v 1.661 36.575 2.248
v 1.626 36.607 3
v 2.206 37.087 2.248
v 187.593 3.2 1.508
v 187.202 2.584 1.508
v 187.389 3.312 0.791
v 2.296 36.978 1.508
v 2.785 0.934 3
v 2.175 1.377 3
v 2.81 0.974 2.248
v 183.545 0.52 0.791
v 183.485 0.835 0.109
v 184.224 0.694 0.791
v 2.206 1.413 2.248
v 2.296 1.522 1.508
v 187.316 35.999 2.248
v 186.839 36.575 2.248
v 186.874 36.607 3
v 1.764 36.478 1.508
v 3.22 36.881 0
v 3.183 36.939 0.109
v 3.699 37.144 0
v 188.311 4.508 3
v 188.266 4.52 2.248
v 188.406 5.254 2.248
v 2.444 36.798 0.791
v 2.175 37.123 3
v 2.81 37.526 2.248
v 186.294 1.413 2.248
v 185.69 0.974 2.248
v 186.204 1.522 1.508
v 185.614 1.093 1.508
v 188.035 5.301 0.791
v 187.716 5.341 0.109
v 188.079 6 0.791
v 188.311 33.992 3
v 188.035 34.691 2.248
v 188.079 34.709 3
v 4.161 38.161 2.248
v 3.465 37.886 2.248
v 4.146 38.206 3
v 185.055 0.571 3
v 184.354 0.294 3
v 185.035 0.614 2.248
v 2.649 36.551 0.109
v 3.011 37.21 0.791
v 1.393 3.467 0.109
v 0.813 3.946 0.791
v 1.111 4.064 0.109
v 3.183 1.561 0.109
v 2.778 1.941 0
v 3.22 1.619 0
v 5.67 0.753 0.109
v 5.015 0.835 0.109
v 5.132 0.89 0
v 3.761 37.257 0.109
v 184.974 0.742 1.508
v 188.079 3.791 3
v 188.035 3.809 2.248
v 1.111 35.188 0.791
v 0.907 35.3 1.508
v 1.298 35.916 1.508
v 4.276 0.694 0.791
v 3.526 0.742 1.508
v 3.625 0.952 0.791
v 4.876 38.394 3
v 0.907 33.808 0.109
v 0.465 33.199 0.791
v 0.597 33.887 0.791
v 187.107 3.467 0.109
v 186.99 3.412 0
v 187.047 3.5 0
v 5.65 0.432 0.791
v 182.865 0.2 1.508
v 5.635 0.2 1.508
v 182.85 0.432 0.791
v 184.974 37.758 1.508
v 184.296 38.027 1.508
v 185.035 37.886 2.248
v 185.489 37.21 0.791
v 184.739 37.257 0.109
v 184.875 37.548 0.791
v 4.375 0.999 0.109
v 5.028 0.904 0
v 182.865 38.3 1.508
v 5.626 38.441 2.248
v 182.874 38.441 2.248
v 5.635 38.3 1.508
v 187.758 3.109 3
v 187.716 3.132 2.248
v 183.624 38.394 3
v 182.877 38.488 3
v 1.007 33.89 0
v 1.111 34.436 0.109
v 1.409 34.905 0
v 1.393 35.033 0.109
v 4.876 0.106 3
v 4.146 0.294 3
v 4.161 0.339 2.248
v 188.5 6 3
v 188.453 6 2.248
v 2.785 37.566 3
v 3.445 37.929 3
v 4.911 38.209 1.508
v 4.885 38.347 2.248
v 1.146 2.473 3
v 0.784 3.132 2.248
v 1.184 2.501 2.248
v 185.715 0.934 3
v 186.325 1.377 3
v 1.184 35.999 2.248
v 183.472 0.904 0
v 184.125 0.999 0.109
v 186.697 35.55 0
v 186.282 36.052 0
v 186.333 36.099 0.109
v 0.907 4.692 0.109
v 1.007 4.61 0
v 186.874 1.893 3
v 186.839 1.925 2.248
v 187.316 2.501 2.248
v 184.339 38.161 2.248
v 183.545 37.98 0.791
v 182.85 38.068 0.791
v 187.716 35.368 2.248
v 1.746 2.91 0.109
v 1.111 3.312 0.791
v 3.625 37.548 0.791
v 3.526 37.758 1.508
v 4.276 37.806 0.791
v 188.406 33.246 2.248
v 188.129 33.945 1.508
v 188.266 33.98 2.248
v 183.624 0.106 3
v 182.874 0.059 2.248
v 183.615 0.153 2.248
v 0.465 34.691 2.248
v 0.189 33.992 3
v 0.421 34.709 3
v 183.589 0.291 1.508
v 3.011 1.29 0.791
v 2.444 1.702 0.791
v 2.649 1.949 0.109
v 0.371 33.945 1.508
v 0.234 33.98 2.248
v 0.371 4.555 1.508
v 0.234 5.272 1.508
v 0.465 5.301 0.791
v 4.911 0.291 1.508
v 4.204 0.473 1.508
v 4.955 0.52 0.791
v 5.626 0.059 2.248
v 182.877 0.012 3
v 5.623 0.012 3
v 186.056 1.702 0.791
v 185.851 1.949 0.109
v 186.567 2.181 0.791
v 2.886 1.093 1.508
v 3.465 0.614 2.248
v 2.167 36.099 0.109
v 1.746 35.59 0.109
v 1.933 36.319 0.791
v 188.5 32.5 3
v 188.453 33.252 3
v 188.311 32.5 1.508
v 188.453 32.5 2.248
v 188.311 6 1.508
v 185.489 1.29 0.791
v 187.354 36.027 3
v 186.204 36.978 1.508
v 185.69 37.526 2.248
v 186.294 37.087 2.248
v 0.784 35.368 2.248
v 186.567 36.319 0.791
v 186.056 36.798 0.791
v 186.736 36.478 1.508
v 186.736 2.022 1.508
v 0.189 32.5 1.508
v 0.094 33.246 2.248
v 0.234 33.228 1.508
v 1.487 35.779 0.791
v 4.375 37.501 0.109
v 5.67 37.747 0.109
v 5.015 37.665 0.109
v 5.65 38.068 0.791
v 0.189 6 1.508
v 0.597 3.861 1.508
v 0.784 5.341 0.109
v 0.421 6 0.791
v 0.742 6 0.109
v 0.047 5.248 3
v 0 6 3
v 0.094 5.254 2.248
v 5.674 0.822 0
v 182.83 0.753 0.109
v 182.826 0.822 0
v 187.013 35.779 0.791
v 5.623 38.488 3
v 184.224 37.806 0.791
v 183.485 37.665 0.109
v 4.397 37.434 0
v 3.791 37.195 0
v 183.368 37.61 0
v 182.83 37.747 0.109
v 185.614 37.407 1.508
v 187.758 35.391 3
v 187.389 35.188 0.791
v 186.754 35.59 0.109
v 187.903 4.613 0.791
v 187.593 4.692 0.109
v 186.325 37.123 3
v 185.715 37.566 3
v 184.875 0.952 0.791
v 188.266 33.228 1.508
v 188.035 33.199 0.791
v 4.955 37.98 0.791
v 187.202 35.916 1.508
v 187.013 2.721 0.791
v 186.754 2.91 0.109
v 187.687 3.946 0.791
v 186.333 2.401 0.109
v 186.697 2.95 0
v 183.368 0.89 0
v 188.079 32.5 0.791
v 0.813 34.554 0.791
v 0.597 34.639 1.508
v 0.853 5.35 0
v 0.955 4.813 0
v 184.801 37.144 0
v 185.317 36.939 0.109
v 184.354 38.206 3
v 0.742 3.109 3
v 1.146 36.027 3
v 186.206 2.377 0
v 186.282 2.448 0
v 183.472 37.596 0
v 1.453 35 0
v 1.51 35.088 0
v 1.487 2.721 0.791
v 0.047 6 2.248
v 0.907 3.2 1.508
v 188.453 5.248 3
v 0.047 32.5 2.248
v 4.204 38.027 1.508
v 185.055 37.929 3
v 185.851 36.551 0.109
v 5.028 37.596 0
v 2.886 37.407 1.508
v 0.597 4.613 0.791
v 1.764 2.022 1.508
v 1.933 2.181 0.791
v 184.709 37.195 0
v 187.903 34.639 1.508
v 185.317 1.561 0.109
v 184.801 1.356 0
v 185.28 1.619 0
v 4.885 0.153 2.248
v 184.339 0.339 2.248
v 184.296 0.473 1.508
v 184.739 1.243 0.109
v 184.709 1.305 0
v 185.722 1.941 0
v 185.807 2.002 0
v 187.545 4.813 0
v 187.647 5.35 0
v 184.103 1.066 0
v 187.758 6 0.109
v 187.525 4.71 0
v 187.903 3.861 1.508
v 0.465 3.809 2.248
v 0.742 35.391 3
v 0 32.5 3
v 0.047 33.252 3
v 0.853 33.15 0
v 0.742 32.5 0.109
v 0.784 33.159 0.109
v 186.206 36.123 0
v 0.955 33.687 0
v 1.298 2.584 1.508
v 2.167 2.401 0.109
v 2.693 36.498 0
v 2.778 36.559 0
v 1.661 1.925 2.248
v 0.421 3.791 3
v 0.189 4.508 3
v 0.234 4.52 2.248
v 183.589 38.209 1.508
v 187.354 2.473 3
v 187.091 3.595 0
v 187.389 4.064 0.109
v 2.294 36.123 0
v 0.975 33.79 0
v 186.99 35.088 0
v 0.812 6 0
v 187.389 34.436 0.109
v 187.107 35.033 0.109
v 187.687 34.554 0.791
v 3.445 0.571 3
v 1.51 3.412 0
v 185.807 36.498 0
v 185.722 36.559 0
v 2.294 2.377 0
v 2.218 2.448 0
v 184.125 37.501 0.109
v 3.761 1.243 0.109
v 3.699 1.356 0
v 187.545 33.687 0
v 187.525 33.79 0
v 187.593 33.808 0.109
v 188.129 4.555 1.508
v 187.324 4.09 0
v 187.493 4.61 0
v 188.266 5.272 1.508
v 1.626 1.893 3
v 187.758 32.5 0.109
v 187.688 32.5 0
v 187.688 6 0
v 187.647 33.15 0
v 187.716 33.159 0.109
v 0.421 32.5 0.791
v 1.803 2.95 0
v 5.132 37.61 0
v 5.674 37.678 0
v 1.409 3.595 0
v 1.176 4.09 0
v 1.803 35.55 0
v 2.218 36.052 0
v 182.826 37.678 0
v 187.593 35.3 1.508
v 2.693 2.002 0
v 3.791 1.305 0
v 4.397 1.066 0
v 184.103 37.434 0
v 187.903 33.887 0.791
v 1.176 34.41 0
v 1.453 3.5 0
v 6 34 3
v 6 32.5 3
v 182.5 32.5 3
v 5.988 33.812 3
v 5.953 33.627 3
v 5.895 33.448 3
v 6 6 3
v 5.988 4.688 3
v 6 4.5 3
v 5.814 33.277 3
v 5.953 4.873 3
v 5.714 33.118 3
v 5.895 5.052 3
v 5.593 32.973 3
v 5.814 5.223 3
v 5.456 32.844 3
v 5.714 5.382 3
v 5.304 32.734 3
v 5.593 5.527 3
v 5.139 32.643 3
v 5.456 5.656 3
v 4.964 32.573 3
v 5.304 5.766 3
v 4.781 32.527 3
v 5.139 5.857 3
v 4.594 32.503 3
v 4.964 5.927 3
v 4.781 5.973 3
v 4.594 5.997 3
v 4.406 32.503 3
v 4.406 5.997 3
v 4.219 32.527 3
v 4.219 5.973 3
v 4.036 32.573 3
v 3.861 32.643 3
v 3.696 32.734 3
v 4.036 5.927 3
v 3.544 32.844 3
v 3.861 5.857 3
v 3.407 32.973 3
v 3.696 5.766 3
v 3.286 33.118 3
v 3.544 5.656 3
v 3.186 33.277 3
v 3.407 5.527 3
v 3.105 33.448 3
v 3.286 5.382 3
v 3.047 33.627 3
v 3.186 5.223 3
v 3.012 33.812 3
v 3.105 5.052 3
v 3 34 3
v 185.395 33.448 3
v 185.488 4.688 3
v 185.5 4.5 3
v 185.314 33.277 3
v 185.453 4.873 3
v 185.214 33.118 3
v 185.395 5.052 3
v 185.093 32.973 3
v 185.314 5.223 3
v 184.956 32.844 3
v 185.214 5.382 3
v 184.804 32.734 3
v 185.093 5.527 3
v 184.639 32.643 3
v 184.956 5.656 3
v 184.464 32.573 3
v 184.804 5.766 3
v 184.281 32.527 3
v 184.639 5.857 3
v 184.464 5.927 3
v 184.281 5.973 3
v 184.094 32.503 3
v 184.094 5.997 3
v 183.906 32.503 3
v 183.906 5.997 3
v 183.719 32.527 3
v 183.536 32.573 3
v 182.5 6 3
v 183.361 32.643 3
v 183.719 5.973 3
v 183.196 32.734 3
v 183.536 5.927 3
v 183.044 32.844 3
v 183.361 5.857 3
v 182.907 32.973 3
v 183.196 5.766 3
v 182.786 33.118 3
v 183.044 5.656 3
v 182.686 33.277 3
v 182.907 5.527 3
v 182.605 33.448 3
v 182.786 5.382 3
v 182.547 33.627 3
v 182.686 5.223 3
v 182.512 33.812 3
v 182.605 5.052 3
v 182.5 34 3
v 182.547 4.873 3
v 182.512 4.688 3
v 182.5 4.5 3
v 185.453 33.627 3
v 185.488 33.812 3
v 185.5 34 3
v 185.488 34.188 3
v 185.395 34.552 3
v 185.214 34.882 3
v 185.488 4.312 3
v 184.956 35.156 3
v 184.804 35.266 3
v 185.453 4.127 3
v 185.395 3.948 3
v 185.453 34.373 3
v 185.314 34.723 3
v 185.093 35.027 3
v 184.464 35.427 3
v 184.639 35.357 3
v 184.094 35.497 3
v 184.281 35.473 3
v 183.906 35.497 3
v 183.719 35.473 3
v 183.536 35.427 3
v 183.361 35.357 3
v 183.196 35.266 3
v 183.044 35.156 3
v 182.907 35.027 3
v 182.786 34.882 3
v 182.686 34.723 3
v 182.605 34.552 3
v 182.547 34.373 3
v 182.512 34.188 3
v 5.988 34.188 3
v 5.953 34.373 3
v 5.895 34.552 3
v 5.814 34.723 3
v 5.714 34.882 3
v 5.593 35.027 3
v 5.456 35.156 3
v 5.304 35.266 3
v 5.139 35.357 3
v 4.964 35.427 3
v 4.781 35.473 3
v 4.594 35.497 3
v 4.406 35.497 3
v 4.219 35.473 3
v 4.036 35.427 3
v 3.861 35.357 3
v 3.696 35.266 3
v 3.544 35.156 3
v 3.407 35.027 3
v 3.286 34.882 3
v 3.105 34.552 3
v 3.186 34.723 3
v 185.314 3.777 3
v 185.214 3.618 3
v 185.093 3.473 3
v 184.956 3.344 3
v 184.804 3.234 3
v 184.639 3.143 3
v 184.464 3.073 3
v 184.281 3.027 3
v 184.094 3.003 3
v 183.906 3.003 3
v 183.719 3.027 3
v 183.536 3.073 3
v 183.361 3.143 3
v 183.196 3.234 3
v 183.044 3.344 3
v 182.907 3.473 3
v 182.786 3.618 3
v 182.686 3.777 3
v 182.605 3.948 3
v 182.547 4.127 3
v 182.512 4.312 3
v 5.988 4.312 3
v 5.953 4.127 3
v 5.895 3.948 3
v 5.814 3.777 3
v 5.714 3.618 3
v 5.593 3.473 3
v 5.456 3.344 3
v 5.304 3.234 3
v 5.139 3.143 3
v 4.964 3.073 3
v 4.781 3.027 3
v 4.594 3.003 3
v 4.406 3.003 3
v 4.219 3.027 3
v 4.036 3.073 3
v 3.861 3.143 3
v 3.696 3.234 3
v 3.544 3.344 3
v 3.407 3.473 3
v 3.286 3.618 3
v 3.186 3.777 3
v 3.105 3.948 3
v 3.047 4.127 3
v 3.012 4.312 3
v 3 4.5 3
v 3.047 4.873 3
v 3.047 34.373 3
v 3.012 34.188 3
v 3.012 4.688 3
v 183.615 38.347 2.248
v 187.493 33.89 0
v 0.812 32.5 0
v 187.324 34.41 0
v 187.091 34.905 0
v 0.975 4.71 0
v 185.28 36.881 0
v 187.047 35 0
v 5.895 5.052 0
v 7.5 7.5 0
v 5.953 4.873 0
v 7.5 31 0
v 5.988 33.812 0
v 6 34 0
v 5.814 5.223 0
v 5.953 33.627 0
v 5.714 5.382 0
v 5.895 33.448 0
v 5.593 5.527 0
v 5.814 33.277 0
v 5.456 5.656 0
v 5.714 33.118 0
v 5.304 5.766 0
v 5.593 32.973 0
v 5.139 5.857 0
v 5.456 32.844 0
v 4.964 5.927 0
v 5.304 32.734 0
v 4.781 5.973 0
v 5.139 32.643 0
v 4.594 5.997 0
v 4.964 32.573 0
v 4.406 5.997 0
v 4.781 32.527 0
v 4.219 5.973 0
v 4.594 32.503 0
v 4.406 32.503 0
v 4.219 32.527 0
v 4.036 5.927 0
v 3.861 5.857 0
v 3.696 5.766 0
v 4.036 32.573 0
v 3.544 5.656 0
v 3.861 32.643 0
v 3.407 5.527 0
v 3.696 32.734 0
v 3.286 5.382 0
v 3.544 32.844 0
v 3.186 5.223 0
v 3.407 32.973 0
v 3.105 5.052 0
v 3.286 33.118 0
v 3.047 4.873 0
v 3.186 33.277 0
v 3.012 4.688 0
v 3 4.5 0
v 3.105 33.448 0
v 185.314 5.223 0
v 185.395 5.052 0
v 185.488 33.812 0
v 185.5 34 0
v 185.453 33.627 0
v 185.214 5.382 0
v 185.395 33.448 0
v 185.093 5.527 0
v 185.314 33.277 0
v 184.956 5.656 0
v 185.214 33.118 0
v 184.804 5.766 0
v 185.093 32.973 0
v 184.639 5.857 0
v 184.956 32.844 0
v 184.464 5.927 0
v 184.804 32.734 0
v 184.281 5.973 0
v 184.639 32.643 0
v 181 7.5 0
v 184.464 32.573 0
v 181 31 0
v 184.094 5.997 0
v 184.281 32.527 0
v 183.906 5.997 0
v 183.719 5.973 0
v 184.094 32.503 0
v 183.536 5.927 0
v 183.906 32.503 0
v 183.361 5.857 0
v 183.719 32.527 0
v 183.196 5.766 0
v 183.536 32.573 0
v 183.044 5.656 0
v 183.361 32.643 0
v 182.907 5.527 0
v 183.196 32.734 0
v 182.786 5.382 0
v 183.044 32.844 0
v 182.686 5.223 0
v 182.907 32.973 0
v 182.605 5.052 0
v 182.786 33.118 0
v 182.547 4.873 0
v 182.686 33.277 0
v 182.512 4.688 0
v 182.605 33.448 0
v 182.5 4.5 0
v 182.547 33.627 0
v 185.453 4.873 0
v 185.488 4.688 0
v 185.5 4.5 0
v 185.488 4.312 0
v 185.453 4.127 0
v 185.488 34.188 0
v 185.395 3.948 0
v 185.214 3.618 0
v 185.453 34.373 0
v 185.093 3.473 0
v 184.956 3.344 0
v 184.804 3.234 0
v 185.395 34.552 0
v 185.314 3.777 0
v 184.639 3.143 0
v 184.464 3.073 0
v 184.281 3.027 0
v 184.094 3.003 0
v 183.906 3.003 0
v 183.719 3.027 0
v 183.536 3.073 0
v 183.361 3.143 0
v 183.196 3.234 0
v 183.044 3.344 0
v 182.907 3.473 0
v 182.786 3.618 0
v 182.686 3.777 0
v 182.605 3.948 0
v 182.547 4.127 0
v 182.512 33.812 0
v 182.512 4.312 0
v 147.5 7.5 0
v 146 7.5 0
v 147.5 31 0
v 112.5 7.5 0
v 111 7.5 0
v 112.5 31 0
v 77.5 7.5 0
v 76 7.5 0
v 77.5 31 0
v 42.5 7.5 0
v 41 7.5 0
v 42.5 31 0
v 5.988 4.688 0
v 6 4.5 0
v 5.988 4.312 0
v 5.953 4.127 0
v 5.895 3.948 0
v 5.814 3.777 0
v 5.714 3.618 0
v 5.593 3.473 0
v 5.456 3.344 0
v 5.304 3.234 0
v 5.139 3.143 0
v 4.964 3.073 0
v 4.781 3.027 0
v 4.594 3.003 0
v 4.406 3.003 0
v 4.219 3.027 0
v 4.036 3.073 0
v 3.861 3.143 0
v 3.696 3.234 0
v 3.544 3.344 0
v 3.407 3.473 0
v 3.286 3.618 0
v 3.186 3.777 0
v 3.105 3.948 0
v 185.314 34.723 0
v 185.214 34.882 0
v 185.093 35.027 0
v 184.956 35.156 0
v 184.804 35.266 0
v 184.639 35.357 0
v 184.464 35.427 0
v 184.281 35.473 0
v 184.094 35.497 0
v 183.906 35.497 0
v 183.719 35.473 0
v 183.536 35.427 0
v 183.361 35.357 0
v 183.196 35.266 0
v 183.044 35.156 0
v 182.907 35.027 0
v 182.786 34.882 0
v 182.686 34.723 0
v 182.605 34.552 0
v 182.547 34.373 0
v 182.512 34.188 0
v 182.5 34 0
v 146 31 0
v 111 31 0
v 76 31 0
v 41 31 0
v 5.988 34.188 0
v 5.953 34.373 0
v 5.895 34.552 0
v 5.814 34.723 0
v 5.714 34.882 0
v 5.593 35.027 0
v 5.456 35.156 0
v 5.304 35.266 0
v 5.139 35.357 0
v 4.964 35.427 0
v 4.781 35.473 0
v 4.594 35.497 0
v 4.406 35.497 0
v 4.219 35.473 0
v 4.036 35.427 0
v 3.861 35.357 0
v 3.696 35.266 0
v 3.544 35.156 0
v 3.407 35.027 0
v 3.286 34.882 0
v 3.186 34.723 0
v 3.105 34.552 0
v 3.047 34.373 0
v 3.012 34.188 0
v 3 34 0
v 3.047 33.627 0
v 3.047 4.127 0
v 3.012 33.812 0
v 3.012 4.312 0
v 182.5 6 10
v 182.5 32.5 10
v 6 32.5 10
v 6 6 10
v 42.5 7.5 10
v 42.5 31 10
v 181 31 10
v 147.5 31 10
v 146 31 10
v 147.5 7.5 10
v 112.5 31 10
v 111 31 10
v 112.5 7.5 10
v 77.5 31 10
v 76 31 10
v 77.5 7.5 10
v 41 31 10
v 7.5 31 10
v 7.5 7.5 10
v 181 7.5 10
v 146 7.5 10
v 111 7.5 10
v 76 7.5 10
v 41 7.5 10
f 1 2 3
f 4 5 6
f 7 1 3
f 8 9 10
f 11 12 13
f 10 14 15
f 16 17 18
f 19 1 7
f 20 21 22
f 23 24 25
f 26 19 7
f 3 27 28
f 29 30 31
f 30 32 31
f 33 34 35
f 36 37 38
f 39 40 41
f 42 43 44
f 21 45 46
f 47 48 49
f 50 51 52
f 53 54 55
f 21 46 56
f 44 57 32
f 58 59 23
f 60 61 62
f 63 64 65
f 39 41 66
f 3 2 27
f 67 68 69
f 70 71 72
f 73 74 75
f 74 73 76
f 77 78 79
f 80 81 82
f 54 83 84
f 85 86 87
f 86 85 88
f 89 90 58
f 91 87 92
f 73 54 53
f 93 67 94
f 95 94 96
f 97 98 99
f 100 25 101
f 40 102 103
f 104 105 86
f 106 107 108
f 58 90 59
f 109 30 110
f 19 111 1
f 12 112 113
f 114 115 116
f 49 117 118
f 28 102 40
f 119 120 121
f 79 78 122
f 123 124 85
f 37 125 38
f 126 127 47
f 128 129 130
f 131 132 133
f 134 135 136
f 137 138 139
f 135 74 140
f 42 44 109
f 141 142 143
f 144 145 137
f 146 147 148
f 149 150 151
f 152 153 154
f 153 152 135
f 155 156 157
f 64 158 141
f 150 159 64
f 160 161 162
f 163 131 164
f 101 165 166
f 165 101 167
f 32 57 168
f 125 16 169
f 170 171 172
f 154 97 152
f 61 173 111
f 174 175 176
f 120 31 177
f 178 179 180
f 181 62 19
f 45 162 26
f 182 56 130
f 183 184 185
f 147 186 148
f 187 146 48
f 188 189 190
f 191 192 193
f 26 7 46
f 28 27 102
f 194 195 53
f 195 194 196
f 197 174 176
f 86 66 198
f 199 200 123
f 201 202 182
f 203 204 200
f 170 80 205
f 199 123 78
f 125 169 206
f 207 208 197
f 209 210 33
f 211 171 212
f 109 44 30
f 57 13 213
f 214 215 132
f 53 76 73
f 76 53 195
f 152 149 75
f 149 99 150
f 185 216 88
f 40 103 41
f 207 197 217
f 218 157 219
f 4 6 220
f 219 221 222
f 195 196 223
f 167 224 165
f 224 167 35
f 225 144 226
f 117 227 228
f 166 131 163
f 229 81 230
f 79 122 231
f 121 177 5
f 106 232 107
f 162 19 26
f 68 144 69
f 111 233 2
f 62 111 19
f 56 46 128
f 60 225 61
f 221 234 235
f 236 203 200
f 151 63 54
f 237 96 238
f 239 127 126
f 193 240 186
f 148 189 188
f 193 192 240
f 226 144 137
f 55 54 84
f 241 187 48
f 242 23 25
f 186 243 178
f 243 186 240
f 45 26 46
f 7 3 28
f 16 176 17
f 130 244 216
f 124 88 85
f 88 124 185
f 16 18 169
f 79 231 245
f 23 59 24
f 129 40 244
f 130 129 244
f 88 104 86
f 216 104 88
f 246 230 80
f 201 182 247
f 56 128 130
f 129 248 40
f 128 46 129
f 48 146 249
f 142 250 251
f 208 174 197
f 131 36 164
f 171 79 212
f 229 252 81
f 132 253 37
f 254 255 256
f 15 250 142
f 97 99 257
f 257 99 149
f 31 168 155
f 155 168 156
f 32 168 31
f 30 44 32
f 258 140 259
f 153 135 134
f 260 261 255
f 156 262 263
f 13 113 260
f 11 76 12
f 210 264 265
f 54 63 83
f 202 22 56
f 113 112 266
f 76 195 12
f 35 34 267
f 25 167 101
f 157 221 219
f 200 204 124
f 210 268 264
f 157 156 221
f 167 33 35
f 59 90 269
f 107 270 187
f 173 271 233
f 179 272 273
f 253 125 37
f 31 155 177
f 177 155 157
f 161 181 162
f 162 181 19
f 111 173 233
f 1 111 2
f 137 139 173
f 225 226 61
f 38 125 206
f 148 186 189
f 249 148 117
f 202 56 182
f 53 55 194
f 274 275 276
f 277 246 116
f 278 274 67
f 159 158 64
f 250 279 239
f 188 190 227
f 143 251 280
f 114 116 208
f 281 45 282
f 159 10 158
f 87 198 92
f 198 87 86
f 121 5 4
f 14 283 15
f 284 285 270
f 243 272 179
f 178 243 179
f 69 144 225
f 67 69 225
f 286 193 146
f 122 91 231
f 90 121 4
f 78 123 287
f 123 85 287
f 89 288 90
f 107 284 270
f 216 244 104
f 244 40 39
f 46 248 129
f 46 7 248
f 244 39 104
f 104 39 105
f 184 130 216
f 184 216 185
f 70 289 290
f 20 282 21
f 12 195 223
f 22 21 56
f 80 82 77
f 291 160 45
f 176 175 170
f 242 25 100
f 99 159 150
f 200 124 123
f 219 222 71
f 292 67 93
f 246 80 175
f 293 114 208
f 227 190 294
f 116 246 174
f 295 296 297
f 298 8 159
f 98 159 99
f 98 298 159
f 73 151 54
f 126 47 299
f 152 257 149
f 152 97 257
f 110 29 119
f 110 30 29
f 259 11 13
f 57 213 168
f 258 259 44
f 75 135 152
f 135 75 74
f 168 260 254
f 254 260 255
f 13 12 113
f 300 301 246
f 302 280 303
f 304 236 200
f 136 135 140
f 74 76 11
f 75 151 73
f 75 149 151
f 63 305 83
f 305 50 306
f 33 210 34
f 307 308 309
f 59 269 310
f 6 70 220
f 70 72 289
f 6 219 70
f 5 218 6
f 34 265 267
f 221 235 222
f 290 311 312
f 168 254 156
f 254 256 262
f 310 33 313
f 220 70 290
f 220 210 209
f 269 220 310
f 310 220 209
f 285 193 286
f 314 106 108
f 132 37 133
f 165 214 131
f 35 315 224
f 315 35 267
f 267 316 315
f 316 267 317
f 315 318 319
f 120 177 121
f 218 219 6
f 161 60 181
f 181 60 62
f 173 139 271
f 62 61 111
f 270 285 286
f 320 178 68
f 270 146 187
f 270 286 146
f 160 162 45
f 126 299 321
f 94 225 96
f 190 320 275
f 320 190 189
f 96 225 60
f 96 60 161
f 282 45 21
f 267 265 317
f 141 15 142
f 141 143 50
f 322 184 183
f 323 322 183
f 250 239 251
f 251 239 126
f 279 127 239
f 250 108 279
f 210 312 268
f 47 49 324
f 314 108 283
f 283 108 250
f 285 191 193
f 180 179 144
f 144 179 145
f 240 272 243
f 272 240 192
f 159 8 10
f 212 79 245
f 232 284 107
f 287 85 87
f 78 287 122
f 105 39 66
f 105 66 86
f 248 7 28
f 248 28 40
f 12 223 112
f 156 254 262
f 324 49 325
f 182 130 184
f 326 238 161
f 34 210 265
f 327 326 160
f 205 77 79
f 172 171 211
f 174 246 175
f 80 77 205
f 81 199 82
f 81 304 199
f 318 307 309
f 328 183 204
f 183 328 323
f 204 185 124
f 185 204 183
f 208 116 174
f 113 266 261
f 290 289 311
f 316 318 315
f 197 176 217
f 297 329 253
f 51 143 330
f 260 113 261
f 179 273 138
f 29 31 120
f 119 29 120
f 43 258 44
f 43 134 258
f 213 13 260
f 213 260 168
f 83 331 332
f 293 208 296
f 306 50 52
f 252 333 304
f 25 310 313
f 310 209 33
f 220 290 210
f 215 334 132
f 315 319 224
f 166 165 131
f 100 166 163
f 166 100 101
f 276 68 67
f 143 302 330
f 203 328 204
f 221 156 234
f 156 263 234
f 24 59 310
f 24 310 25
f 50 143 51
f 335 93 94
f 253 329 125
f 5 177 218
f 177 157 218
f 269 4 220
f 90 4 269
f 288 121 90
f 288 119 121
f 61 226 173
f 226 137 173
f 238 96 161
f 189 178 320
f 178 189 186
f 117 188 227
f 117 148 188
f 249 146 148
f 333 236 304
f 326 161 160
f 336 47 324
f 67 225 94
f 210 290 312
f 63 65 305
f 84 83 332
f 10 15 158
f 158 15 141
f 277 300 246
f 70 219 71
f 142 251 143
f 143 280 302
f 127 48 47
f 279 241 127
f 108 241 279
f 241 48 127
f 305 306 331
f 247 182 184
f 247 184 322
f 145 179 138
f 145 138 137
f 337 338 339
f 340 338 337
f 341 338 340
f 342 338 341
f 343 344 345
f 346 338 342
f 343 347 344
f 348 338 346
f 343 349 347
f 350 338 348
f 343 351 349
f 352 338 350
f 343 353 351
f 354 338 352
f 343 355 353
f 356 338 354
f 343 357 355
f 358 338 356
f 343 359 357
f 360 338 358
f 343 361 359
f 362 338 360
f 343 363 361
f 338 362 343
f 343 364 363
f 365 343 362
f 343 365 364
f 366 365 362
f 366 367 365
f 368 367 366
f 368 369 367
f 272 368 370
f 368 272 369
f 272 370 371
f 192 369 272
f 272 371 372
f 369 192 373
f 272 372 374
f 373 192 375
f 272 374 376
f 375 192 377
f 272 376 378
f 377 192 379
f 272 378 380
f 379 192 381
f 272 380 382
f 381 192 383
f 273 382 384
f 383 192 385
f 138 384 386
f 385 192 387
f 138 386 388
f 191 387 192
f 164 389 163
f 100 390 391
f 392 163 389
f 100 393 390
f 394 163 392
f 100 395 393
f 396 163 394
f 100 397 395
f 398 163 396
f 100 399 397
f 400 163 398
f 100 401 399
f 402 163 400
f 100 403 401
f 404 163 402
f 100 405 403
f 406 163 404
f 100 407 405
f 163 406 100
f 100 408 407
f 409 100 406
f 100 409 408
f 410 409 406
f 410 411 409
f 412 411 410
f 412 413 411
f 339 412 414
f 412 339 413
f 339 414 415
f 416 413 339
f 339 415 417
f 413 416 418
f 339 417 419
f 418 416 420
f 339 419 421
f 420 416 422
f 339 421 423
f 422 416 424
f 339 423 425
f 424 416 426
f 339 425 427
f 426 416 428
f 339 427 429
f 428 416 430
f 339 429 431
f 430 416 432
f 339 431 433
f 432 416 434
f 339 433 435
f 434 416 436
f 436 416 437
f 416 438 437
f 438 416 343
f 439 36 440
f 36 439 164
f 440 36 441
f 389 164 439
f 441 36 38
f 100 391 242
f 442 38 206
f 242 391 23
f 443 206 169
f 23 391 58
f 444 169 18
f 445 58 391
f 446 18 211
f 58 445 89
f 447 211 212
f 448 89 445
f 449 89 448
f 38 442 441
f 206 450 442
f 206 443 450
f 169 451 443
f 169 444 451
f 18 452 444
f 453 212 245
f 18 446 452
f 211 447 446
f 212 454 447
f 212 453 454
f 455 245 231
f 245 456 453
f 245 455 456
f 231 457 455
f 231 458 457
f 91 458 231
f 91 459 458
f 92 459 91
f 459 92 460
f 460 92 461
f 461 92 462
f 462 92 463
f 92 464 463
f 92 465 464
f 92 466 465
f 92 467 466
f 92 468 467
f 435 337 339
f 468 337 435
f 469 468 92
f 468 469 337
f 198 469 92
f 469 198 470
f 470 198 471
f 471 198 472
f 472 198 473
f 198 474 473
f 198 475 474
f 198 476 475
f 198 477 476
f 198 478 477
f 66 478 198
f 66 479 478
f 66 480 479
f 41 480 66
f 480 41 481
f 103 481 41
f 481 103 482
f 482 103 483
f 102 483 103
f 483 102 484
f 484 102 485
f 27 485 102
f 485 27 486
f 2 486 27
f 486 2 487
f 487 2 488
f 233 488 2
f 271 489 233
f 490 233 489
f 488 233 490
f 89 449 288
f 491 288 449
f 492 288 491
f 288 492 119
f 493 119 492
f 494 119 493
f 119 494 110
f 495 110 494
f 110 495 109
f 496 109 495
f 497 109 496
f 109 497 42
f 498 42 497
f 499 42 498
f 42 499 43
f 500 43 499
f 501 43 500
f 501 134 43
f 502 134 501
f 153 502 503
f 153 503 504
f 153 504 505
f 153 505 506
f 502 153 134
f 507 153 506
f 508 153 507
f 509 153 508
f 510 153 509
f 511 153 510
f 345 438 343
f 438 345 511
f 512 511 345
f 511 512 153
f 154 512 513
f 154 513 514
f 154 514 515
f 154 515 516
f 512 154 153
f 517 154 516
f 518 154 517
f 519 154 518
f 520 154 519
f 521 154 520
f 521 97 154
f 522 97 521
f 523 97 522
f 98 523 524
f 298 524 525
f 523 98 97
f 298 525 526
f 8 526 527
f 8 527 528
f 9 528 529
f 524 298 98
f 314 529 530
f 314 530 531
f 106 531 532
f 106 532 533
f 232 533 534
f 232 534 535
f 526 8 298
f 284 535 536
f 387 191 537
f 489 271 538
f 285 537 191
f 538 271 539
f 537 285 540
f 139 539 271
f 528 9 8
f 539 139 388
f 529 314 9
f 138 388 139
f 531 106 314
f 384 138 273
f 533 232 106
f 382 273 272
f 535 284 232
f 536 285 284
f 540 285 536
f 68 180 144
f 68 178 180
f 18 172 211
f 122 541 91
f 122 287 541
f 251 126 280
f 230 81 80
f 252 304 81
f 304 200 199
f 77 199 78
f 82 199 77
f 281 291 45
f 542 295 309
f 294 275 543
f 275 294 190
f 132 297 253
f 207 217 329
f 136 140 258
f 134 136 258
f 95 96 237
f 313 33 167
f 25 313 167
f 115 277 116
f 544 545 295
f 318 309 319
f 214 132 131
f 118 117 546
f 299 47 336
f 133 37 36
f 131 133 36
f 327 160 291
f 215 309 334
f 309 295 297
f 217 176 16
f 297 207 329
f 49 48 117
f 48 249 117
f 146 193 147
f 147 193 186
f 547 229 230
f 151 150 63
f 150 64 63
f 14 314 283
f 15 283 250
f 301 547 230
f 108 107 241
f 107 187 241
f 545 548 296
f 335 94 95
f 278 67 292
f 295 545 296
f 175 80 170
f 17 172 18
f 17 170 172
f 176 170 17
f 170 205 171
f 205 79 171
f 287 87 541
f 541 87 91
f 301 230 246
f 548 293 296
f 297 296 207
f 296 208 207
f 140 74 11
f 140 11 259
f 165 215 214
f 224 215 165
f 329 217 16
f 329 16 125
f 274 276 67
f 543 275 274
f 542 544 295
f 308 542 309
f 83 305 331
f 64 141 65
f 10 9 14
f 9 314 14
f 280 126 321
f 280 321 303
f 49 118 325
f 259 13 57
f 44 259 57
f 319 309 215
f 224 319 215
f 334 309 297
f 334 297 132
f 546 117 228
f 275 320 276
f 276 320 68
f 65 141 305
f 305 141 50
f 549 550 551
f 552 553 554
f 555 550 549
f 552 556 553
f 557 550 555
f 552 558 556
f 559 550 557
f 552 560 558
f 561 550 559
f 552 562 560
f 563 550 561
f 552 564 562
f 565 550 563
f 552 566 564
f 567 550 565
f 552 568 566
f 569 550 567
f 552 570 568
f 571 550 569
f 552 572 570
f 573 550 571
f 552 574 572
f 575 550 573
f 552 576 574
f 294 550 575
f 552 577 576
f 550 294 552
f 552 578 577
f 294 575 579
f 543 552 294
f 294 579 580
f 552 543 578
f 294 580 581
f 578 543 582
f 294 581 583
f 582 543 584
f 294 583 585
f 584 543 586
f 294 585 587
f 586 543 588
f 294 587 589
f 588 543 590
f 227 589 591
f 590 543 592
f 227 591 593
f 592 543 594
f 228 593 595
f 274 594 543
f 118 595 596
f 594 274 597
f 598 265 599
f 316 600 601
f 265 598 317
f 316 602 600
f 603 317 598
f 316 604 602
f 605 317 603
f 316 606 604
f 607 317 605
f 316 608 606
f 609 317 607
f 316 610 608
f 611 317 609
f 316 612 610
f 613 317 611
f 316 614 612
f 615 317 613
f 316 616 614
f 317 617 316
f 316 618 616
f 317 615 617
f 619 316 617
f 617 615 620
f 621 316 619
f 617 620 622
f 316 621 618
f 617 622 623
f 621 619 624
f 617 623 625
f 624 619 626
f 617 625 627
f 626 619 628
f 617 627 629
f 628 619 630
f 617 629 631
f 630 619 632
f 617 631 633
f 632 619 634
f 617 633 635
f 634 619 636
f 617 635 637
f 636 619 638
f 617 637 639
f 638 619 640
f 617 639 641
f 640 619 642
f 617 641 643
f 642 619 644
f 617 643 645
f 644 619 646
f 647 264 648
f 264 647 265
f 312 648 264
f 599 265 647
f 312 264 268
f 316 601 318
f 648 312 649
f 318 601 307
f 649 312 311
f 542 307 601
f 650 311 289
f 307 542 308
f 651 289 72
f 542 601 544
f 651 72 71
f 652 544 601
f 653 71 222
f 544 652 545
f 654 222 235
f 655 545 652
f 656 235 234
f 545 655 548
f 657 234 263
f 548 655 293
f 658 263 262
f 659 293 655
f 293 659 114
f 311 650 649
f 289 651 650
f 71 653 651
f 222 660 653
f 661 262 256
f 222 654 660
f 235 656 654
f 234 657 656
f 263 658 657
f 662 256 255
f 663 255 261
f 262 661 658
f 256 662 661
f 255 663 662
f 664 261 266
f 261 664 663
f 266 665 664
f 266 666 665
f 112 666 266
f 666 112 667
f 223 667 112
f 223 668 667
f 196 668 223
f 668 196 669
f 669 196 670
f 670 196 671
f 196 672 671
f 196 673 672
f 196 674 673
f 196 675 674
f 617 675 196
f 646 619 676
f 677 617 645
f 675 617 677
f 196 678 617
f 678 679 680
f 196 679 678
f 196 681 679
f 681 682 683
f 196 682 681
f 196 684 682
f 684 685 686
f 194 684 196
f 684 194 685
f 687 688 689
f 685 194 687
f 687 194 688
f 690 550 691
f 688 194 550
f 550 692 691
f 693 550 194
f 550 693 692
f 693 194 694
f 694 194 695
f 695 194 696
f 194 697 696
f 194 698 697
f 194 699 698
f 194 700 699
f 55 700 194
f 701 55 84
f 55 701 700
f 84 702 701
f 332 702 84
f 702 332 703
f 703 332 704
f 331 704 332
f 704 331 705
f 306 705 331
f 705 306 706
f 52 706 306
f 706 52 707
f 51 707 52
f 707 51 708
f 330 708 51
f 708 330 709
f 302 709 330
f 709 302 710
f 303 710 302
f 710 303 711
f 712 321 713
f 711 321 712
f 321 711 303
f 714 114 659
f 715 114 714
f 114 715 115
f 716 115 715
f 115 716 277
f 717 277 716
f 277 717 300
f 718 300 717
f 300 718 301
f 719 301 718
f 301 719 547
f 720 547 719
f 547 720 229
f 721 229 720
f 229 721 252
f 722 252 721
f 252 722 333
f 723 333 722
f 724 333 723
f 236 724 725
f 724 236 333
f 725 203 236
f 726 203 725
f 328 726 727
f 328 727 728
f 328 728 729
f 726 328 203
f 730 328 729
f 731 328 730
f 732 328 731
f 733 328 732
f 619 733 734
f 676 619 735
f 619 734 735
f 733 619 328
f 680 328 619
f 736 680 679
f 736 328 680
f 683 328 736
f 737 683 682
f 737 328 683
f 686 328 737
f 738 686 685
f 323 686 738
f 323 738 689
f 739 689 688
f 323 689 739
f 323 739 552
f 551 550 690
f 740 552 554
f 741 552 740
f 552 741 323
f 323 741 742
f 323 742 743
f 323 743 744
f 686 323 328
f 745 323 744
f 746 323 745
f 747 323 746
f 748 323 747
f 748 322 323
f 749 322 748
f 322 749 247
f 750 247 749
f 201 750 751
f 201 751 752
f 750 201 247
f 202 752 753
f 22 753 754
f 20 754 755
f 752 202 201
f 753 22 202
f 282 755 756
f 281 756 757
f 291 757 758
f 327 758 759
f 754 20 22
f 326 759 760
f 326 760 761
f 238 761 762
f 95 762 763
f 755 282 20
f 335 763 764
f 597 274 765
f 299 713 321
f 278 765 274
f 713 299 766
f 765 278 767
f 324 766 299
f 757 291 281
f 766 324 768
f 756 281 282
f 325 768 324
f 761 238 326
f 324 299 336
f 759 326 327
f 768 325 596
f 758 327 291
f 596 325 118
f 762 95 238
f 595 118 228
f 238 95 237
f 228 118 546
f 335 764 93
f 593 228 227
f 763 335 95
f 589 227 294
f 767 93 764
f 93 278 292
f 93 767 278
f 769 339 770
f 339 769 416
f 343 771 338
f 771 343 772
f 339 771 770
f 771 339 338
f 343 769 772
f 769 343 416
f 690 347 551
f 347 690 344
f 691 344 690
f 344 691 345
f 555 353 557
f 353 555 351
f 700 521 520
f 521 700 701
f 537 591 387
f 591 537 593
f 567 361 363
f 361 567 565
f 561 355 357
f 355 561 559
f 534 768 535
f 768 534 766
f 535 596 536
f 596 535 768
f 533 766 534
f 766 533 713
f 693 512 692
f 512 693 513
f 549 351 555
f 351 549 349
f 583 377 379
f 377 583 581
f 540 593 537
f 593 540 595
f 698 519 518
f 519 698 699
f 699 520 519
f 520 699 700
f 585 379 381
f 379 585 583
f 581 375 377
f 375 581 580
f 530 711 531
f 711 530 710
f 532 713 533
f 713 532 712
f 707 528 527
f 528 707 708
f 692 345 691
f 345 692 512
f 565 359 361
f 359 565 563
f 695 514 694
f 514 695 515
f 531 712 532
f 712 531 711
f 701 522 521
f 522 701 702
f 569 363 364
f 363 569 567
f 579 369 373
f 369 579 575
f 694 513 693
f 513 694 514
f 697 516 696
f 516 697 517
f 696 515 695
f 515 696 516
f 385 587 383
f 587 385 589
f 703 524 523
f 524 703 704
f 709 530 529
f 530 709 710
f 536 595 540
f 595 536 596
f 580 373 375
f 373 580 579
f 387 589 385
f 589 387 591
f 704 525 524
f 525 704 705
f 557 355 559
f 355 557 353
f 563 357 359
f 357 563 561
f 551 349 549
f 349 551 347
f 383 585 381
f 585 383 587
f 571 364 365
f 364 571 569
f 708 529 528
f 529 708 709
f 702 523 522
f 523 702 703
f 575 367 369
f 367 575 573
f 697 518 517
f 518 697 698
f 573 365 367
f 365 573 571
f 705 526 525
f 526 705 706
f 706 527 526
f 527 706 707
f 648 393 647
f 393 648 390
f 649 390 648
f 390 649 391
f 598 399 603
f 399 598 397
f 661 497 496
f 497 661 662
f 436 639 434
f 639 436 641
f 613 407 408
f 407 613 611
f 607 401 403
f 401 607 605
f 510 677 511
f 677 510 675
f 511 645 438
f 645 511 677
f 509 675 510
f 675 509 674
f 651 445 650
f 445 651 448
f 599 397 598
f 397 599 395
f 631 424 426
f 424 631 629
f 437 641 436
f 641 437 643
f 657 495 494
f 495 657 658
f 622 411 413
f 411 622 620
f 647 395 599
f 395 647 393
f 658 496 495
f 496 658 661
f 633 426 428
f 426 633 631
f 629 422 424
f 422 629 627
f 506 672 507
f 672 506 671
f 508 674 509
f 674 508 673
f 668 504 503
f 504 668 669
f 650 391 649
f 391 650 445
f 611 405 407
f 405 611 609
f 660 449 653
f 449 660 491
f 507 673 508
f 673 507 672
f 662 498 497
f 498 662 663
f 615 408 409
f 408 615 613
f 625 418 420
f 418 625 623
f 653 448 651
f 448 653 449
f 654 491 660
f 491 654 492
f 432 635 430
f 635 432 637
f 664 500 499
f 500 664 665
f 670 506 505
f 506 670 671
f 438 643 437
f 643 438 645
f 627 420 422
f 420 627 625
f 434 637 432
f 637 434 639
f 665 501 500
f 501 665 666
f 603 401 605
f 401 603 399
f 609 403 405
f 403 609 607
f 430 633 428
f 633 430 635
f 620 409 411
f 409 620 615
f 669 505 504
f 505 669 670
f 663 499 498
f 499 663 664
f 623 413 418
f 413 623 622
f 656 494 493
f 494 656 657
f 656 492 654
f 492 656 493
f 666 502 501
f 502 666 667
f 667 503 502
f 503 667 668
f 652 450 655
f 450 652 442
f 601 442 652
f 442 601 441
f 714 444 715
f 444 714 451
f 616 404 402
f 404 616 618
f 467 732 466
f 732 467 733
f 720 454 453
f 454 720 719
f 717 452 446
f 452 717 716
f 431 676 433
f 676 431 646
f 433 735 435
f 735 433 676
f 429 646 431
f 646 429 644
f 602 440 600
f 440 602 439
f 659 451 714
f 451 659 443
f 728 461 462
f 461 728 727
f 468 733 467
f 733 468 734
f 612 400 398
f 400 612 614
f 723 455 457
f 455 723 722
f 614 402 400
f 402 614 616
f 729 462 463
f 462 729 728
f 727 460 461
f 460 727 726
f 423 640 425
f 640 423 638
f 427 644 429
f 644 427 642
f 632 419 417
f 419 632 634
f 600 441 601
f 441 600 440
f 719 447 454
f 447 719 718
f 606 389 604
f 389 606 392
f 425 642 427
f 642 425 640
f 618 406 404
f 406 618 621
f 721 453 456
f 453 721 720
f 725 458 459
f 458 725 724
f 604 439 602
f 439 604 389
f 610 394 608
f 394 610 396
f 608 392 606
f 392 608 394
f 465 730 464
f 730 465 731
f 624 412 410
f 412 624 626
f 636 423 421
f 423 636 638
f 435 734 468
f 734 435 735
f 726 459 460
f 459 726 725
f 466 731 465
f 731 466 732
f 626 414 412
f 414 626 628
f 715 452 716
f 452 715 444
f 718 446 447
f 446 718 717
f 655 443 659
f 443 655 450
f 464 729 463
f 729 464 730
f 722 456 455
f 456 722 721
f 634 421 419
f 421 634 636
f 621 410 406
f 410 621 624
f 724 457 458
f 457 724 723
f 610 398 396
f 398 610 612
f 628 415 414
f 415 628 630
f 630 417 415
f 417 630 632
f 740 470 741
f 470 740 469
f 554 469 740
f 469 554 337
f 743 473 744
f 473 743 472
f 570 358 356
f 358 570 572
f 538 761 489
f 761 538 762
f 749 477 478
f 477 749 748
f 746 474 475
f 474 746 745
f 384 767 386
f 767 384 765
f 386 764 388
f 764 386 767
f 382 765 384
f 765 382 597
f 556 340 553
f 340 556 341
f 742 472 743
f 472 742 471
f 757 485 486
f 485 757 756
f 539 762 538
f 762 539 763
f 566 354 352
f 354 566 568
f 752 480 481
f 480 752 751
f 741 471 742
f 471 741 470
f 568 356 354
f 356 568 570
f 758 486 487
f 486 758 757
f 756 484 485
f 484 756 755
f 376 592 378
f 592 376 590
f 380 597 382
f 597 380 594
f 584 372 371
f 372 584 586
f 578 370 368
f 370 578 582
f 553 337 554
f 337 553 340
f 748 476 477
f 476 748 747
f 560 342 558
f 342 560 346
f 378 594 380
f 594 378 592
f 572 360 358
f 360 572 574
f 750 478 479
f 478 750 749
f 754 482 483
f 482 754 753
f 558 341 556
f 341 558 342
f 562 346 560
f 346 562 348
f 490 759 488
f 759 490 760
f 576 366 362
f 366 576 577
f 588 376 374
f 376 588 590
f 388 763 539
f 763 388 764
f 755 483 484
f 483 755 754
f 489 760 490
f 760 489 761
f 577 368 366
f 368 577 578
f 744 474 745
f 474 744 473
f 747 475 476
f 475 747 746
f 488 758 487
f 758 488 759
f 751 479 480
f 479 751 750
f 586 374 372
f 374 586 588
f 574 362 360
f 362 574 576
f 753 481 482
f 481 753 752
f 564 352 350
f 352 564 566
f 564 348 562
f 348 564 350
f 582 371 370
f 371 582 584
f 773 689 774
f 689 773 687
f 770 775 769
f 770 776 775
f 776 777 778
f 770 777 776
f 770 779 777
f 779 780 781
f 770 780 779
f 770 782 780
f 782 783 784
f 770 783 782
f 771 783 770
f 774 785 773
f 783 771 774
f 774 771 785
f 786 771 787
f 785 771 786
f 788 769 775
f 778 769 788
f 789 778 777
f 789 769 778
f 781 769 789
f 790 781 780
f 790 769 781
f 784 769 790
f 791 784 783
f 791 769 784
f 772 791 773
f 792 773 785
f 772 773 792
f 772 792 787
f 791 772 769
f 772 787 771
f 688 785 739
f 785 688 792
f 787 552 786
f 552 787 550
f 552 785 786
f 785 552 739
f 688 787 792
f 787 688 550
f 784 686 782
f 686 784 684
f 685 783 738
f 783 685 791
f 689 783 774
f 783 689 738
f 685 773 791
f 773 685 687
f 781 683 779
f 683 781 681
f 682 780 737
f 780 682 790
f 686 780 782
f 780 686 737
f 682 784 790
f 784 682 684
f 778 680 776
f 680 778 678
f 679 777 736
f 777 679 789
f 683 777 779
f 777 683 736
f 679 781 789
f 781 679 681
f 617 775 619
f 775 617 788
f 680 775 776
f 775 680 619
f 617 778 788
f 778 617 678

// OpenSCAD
// file: face-plate.scad
module truncated_hemisphere(thickness)
{
	r = 2 * thickness;
	difference() {
		translate(v = [0, 0, thickness])
			sphere(r);
		translate(v = [0, 0, -r])
			cube(size = [2 * r, 2 * r, 2 * r], center = true);
		translate(v = [0, 0, 3 * thickness])
			cube(size = [2 * r, 2 * r, 2 * r], center = true);
	}
}

module face_plate(width, height, thickness)
{
	r = 2 * thickness;
	hull() {
		translate(v = [r, r, 0])
			truncated_hemisphere(r / 2);
		translate(v = [width - r, r, 0])
			truncated_hemisphere(r / 2);
		translate(v = [width - r, height - r, 0])
			truncated_hemisphere(r / 2);
		translate(v = [r, height - r, 0])
			truncated_hemisphere(r / 2);
	}
}
// file: large-switch-array-holder.scad
include <face-plate.scad>

$fn = 50;

/* Set rows and cols before including this file */
/*
rows = 2;
cols = 2;
*/

clearance = 0.5;
width = 33 + clearance;
height = 23 + clearance;
depth = 10;
outer_width = width + 3;
outer_height = height + 3;
edge_width = 6;

module switch_holder_screw_hole()
{
	translate(v = [0, 0, -1])
		cylinder(r1 = 1.5, r2 = 1.5, h = 10);
}

module switch_holder()
{
	translate(v = [0.5 * outer_width, 0.5 * outer_height, 0.5 * depth])
		difference() {
			cube(size = [outer_width, outer_height, depth], center = true);
			cube(size = [width, height, depth + 5], center = true);
		}
}

module switch_holder_array(r, c)
{
	union() {
		for (i = [0 : 1 : r - 1]) {
			translate(v = [0, (height + 1.5) * i, 0]) {
				for (j = [0 : 1 : c - 1]) {
					translate(v = [(width + 1.5) * j, 0, 0]) {
						switch_holder();
					}
				}
			}
		}
	}
}

module switch_holder_face_plate(r, c)
{
	w = c * (width + 1.5) + 1.5;
	h = r * (height + 1.5) + 1.5;
	thickness = 3;

	difference() {
		face_plate(w + 2 * edge_width, h + 2 * edge_width, 3);
		translate(v = [edge_width, edge_width, -3]) {
			cube(size = [w, h, 10]);
		}
		translate(v = [0.75 * edge_width, 0.75 * edge_width, 0])
			switch_holder_screw_hole();
		translate(v = [w + 1.25 * edge_width, 0.75 * edge_width, 0])
			switch_holder_screw_hole();
		translate(v = [w + 1.25 * edge_width, h + 1.25 * edge_width, 0])
			switch_holder_screw_hole();
		translate(v = [0.75 * edge_width, h + 1.25 * edge_width, 0])
			switch_holder_screw_hole();
	}
}

union() {
	switch_holder_face_plate(rows, cols);
	translate(v = [edge_width, edge_width, 0])
		switch_holder_array(rows, cols);
}
// main file
rows=1;
cols=5;

include <large-switch-array-holder.scad>
